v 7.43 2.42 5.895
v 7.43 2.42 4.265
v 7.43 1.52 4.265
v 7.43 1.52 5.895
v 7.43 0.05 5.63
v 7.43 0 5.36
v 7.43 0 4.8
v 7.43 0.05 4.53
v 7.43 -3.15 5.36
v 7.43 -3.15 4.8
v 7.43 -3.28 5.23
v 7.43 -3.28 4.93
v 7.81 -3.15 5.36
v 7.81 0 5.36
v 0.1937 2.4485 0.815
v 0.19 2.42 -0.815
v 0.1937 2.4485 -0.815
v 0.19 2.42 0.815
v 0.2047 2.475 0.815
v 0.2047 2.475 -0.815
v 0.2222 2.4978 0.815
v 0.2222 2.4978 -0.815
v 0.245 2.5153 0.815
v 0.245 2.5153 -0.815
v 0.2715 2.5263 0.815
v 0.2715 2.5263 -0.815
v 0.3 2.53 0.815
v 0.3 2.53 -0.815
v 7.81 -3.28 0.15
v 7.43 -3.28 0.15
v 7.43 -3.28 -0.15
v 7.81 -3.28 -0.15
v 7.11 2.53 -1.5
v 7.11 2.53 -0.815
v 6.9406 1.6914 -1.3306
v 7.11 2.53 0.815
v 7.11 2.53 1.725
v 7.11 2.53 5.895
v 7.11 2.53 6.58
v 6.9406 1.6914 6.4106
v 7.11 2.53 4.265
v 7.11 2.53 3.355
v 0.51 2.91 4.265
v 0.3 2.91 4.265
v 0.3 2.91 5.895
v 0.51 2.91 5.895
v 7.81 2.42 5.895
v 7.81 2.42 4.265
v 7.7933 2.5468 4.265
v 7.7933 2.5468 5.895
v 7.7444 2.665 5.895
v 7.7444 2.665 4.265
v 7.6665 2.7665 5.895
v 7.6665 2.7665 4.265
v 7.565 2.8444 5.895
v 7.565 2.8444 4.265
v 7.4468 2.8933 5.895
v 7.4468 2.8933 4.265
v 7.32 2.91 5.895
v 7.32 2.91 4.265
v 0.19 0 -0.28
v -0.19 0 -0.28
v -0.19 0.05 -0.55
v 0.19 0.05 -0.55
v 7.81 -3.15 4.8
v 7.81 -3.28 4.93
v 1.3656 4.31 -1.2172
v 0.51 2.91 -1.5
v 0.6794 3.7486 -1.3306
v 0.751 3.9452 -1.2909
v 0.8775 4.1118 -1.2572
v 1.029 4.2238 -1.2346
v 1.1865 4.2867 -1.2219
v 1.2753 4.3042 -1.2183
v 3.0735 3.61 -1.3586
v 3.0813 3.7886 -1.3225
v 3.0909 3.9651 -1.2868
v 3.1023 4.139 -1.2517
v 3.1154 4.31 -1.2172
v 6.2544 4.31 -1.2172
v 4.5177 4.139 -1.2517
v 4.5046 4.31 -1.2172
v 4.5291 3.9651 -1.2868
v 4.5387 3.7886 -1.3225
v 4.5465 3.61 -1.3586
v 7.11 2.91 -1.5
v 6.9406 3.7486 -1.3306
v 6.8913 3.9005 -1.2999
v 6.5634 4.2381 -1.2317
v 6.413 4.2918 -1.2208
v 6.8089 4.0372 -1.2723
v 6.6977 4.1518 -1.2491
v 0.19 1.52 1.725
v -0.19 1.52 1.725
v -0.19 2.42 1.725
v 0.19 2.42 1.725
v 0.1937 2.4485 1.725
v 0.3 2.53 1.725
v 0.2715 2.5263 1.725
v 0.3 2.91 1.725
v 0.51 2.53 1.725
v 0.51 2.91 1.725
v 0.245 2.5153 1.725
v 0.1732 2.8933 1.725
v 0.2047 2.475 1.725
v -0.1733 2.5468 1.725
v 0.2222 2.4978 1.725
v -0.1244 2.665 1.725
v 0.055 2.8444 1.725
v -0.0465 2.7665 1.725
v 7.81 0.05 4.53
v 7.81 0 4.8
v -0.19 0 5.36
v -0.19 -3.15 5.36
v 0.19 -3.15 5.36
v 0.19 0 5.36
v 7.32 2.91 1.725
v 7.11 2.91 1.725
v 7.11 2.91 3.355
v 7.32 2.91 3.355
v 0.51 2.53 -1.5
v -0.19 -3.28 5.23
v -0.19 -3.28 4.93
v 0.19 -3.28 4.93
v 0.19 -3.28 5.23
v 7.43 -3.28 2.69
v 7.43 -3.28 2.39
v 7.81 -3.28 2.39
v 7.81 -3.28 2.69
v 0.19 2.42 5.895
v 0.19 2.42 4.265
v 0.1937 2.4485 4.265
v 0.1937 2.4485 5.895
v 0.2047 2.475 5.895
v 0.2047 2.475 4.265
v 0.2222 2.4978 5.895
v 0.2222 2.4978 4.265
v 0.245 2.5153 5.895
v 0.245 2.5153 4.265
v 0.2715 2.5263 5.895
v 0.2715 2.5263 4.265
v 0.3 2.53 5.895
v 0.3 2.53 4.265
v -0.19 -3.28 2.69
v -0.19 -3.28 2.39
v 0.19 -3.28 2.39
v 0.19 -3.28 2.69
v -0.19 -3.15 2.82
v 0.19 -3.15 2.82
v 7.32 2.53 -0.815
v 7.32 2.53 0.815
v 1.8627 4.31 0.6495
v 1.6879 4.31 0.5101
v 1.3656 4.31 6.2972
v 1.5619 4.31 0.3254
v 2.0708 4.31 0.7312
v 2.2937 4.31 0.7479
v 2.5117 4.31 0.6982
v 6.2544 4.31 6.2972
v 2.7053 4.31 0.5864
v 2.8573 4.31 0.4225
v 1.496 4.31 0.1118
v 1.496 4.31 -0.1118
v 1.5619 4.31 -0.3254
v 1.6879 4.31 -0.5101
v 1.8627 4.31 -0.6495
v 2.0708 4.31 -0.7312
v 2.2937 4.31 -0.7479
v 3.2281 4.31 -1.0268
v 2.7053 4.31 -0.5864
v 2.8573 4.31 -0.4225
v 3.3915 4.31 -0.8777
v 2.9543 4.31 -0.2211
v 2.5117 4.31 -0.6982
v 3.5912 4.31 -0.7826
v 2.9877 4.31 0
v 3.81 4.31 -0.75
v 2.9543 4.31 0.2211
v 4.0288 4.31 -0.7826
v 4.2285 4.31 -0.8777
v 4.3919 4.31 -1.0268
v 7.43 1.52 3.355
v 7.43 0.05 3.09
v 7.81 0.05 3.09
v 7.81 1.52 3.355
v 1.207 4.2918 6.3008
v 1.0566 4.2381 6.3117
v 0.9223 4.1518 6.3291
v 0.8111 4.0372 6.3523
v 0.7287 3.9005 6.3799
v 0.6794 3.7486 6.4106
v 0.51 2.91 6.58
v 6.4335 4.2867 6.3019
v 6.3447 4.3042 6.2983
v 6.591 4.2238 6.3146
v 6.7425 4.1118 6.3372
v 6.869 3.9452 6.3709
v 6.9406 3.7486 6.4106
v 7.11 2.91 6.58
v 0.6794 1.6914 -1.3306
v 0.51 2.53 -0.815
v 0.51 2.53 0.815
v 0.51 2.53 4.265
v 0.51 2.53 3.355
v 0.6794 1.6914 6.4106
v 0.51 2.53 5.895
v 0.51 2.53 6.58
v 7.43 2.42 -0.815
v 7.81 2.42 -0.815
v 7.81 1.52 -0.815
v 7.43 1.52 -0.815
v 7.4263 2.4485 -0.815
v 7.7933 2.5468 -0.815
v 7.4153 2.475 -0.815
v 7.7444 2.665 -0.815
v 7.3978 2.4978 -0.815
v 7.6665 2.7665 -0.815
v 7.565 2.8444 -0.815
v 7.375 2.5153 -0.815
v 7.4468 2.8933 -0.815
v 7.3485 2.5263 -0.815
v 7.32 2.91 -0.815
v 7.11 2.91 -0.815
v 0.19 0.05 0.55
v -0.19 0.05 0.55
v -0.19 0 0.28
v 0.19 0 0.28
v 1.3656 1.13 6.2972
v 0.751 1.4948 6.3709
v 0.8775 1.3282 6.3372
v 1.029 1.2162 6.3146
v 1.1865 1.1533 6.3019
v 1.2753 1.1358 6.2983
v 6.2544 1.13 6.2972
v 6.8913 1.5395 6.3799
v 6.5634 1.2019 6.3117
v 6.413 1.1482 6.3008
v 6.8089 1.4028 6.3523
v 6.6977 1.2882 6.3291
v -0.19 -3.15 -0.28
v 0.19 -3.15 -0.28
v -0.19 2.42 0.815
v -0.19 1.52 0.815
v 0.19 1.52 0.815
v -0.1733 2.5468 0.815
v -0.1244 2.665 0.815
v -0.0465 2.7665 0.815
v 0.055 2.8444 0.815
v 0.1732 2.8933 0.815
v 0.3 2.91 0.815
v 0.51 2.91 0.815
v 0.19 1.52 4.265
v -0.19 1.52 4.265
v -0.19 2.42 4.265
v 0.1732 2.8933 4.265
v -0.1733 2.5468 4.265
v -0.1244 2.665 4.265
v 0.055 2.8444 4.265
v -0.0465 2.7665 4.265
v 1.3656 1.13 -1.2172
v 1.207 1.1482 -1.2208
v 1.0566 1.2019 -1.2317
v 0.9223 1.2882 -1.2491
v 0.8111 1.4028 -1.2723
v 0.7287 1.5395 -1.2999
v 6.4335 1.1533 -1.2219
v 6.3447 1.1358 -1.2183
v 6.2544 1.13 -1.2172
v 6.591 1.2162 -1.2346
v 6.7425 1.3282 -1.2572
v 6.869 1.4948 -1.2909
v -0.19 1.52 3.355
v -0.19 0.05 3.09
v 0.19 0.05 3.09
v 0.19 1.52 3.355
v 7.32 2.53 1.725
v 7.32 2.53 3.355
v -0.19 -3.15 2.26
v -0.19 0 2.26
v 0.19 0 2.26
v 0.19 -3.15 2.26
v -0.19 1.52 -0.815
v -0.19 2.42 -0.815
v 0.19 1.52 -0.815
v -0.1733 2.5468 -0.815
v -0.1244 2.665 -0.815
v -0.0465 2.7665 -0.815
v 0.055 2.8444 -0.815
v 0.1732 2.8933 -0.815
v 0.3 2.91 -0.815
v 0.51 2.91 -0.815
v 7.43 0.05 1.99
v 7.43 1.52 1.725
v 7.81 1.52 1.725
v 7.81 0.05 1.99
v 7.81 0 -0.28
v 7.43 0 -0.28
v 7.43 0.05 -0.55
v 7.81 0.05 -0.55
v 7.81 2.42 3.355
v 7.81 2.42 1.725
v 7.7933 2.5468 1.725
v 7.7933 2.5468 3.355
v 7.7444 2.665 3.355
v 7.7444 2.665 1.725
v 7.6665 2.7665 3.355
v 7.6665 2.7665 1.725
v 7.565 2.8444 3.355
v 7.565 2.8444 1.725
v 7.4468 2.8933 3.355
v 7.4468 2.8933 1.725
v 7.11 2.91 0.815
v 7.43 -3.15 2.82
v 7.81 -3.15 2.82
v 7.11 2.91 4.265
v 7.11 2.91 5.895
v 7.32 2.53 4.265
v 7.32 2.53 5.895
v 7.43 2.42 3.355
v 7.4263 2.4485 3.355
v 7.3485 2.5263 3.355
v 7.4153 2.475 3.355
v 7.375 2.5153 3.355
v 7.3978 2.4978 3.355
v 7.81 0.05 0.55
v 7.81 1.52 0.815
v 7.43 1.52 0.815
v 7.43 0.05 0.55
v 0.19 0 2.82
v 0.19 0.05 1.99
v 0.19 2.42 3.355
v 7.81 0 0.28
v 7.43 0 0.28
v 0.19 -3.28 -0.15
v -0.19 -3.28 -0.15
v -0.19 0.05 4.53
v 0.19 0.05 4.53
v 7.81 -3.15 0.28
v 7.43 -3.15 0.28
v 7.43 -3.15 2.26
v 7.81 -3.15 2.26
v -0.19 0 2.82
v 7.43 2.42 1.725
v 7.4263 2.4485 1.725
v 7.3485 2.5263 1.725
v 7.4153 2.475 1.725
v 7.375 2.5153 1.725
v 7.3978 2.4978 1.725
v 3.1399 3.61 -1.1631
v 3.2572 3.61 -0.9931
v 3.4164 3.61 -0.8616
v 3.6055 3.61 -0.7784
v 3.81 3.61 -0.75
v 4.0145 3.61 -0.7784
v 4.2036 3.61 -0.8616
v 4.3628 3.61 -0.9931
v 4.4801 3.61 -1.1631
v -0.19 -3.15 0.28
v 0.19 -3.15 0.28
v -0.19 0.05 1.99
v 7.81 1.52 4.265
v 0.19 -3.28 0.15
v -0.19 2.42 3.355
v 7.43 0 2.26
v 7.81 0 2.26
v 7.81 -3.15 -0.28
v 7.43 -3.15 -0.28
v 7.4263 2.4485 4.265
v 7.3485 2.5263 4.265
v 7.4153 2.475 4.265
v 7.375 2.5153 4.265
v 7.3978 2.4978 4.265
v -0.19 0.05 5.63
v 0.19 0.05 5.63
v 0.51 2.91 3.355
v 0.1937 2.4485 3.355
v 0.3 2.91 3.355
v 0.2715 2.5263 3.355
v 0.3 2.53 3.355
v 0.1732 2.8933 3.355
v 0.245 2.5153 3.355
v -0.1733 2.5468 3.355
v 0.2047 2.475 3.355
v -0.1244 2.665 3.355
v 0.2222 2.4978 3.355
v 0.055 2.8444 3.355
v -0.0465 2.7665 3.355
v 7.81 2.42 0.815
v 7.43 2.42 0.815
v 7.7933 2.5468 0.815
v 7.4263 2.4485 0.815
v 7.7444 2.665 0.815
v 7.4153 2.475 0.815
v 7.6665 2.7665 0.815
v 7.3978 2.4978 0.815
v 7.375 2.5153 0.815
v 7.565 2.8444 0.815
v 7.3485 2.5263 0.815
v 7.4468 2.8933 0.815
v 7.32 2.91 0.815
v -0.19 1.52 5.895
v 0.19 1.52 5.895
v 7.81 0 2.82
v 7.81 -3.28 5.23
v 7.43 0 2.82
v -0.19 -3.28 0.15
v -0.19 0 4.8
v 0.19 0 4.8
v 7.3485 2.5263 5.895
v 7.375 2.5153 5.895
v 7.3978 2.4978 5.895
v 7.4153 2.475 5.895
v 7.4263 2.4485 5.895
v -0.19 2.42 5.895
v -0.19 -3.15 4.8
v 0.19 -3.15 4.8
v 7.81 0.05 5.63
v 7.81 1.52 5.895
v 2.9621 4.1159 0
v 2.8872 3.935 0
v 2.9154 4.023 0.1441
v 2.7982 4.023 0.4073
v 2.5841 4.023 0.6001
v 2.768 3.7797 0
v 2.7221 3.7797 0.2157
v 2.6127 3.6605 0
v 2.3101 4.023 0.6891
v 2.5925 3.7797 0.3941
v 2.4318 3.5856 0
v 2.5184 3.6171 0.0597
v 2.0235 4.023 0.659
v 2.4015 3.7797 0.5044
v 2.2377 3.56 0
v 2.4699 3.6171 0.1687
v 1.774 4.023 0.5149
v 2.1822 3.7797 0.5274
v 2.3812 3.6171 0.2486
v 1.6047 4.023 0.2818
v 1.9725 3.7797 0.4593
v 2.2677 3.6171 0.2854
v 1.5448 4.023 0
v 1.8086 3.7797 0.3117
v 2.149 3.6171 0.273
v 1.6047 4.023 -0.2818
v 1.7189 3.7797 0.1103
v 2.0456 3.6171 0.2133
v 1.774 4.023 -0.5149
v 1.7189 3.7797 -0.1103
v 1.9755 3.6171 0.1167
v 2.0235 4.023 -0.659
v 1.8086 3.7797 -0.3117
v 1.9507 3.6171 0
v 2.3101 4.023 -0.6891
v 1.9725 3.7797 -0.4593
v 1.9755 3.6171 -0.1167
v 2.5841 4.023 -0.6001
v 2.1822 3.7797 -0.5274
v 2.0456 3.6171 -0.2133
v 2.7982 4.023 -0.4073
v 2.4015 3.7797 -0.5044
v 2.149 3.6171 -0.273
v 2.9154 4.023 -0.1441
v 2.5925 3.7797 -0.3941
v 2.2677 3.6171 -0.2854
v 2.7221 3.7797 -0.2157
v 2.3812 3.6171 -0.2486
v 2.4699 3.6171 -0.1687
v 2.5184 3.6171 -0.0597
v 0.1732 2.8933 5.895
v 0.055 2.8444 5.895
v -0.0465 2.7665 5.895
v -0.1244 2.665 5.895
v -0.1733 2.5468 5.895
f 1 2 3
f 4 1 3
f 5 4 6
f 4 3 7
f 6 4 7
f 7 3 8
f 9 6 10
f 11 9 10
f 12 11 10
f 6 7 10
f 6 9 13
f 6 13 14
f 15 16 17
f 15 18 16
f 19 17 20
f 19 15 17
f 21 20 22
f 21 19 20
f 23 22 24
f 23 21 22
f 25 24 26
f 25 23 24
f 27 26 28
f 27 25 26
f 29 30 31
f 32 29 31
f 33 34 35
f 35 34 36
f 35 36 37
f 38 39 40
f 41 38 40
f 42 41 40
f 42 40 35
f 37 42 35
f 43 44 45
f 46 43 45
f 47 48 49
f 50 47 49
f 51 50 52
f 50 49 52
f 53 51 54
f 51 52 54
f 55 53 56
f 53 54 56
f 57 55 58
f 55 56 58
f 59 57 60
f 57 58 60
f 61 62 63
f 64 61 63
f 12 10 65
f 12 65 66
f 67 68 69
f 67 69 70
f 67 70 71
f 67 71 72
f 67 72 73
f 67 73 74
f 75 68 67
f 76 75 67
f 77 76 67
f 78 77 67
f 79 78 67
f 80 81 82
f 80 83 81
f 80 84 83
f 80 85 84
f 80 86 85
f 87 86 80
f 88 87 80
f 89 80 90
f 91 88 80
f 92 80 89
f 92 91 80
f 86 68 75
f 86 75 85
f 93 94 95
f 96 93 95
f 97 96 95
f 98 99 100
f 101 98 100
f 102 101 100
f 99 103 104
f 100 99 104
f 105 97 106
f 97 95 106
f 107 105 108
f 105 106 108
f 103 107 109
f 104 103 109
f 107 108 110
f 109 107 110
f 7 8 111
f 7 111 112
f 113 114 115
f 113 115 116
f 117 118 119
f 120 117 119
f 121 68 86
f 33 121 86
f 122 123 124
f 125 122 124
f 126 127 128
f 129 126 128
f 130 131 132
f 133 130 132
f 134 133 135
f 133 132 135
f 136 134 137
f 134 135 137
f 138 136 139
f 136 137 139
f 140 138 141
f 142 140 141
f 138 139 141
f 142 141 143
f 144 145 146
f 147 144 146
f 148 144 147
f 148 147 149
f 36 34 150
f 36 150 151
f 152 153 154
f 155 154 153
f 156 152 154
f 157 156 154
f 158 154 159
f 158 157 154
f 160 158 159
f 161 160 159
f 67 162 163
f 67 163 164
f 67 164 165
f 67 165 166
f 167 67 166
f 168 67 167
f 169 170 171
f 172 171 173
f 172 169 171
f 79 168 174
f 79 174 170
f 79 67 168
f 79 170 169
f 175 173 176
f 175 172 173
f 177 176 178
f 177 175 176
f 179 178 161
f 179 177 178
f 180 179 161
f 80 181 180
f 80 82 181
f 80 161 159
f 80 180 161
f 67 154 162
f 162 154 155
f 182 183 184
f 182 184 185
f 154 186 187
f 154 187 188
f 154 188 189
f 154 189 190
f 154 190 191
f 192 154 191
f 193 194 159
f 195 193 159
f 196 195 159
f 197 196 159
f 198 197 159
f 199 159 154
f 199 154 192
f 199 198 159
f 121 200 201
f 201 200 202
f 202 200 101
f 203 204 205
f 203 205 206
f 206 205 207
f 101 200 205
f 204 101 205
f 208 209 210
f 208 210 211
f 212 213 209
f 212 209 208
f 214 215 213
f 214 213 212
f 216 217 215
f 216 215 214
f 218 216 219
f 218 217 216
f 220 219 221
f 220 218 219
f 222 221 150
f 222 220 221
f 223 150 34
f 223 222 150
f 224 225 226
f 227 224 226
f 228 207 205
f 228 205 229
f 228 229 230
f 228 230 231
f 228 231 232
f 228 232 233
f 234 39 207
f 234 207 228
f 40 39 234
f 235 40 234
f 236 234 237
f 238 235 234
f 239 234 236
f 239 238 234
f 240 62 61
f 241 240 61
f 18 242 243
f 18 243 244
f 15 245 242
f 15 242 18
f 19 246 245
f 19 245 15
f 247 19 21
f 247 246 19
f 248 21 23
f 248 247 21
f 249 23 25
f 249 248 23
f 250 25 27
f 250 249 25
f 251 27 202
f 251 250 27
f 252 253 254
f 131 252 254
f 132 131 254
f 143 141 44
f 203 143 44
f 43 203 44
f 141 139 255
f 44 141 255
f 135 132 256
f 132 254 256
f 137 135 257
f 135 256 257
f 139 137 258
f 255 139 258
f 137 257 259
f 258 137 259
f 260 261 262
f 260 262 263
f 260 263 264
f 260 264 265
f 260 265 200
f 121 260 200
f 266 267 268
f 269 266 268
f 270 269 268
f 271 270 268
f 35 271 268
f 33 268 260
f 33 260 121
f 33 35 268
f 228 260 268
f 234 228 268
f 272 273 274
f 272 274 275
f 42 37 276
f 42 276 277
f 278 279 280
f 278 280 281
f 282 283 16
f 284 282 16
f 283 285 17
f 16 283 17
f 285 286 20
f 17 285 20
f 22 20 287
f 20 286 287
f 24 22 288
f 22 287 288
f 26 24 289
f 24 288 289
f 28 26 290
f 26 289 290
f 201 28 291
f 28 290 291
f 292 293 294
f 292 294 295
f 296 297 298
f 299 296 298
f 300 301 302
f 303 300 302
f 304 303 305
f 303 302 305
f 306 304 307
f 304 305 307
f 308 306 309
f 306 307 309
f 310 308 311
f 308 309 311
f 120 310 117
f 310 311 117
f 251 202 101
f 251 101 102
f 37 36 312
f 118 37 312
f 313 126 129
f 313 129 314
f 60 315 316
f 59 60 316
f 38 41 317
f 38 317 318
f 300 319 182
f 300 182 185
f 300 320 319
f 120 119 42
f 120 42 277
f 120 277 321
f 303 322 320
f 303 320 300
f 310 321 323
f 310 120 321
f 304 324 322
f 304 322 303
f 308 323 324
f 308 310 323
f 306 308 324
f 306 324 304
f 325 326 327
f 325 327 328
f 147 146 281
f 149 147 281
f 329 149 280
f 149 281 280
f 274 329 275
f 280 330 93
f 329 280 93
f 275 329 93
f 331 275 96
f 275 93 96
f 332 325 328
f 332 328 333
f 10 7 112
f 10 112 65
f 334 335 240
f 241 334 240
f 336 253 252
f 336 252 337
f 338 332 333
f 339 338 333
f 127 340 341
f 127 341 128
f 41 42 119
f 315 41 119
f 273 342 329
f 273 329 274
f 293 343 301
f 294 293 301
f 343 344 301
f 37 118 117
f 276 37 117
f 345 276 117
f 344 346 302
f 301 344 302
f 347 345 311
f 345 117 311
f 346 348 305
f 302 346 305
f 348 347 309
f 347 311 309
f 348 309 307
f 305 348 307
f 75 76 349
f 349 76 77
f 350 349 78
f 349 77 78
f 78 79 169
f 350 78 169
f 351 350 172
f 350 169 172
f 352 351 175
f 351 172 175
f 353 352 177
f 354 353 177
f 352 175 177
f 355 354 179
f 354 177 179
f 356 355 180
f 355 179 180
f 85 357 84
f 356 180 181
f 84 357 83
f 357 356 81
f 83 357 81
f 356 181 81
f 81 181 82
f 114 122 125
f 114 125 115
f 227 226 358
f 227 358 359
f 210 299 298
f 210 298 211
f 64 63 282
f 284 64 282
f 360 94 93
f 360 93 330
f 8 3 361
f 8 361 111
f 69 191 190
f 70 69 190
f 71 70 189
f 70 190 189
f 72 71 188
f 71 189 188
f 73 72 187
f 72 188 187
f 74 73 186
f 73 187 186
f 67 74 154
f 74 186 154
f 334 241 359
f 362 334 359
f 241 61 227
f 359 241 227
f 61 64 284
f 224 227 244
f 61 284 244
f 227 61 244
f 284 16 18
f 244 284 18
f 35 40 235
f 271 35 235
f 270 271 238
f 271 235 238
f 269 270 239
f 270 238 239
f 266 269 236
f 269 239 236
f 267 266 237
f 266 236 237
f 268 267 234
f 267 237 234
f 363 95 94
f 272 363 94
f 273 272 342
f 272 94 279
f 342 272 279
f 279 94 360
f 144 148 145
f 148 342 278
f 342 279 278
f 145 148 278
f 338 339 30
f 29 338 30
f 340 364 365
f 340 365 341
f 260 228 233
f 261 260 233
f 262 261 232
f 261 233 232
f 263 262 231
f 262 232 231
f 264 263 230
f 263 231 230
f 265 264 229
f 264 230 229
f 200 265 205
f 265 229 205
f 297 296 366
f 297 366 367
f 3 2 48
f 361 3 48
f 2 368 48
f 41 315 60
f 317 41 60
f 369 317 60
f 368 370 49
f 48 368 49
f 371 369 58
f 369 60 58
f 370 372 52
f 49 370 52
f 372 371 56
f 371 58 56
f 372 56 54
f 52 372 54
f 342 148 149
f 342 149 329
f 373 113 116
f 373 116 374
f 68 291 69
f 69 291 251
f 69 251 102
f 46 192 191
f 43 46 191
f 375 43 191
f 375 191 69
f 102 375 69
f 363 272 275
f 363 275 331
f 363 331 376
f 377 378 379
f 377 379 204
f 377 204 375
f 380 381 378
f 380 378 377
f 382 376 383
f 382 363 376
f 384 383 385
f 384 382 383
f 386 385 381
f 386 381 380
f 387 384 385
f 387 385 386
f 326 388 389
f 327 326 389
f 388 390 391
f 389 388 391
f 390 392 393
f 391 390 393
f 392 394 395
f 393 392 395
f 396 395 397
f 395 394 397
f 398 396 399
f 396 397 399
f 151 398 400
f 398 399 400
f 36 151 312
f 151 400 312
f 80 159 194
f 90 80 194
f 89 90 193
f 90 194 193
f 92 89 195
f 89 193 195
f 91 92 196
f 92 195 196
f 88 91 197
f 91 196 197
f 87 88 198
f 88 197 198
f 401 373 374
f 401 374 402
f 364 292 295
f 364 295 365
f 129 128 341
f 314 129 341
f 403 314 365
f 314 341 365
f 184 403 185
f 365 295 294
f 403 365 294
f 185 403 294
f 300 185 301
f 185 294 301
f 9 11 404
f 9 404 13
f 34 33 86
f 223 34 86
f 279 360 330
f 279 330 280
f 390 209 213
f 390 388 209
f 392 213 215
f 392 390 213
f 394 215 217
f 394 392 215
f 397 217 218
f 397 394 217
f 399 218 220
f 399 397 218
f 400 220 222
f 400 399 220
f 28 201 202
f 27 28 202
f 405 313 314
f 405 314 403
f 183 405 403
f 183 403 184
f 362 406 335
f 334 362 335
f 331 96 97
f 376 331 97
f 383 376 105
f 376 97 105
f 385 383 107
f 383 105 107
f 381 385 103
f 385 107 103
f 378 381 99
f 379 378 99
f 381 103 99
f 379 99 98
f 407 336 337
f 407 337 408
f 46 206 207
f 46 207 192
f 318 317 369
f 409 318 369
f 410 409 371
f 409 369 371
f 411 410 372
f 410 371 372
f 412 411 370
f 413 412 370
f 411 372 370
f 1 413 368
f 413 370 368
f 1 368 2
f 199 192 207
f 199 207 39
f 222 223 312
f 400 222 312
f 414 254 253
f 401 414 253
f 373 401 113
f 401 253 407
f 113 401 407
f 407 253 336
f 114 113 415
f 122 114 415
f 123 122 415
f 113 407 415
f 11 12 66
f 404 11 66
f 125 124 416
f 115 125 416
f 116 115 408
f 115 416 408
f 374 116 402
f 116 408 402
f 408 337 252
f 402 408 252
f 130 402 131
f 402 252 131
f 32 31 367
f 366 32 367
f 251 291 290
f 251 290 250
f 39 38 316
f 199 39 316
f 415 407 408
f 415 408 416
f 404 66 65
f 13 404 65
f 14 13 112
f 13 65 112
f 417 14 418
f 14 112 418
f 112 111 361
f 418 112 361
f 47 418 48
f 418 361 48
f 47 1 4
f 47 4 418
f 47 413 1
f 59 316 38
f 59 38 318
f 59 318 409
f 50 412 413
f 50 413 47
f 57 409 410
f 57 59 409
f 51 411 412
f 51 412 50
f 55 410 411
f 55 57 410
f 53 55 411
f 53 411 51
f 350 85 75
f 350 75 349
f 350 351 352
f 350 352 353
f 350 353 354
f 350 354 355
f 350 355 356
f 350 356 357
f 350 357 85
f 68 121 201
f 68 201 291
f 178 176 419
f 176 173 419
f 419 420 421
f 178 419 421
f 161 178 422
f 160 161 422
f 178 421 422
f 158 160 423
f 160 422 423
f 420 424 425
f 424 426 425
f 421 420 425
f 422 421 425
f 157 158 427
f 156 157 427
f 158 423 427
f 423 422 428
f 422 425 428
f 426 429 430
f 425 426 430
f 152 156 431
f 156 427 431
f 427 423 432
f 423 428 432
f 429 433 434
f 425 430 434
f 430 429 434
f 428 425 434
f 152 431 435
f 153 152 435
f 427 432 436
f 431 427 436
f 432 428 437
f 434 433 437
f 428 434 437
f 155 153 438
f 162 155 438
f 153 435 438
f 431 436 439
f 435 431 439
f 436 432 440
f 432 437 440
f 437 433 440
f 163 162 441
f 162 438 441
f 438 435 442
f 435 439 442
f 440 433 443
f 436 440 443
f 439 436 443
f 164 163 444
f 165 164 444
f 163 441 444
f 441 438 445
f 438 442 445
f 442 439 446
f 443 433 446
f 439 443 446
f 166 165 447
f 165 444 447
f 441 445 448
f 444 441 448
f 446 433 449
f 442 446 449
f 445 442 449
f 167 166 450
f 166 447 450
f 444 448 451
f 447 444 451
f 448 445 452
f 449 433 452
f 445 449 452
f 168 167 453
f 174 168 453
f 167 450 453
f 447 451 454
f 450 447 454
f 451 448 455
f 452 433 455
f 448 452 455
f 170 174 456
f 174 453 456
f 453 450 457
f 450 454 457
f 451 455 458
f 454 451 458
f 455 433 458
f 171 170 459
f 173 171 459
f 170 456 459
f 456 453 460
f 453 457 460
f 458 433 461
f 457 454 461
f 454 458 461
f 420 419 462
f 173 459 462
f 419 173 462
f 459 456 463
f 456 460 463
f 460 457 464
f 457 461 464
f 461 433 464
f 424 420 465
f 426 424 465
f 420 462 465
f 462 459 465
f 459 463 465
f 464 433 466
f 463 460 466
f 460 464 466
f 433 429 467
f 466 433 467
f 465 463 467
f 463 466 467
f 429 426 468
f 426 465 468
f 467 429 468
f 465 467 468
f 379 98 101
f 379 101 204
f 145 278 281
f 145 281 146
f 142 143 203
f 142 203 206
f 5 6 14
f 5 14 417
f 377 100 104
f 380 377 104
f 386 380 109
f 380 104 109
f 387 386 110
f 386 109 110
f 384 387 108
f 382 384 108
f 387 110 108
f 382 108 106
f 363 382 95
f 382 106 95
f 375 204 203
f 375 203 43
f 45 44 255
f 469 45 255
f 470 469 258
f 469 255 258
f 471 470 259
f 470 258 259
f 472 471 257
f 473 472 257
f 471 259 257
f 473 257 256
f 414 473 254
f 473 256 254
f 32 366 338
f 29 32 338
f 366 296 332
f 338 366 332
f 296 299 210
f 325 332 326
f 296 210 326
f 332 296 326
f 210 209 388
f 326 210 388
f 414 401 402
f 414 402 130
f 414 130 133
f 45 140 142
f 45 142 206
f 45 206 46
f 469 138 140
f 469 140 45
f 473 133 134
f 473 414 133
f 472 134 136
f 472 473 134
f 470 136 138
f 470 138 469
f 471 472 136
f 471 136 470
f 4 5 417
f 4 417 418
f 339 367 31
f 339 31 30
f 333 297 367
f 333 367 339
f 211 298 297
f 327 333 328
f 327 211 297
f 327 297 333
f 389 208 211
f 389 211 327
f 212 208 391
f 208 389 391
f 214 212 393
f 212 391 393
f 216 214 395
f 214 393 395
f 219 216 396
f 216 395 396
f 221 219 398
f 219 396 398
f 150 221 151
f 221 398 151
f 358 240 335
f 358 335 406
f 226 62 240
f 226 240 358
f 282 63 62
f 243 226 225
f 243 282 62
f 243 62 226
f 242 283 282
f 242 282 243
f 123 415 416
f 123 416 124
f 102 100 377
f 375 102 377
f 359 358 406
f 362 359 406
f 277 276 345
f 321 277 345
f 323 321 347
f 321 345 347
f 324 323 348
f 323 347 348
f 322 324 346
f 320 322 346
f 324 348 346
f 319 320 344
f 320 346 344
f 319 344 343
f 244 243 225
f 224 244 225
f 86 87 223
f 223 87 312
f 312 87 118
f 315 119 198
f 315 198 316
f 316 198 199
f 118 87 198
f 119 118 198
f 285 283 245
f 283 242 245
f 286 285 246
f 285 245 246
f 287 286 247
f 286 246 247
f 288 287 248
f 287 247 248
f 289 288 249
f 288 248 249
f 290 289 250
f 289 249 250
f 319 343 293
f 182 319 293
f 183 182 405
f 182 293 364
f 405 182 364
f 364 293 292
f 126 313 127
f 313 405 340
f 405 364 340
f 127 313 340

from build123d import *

# Parameters (mm, degrees)
BASE_EXTRUDE_DEPTH      = 6.58
BASE_EXTRUDE_DEPTH_BACK = 1.5
SKETCH1_W               = 6.6
SKETCH1_H               = 3.18
SKETCH2_OUTSIDE_W       = 10.782
SKETCH2_OUTSIDE_H       = 7.362
CUT_EXTRUDE1_DEPTH      = 12.593731065
SKETCH3_OUTSIDE_W       = 12.262
SKETCH3_OUTSIDE_H       = 7.362
CUT_EXTRUDE2_DEPTH      = 11.268032918
SKETCH5_W               = 1.63
SKETCH5_H               = 0.38
BOSS_EXTRUDE3_DEPTH     = 0.7
SKETCH6_W               = 0.38
SKETCH6_H               = 1.63
BOSS_EXTRUDE4_DEPTH     = 2.53
SKETCH4_W               = 0.38
SKETCH4_H               = 0.56
BOSS_EXTRUDE5_DEPTH     = 3.28
CUT_EXTRUDE5_DEPTH      = 0.38
FILLET1_R               = 0.49
FILLET2_R               = 0.11
FILLET1_OF_MIRROR1_R    = 0.49
FILLET2_OF_MIRROR1_R    = 0.11
LPATTERN1_START         = 0.3
LPATTERN1_OUTLINE_W     = 0.38
LPATTERN1_OUTLINE_H     = 1.63
LPATTERN1_DEPTH         = 7.02
LPATTERN1_START_2       = 1.725
LPATTERN1_2_DEPTH       = 1.63
LPATTERN1_START_3       = 4.265
LPATTERN1_3_DEPTH       = 1.63
LPATTERN1_START_4       = -0.19
LPATTERN1_4_DEPTH       = 0.38
LPATTERN1_START_5       = 7.43
LPATTERN1_5_DEPTH       = 0.38
SKETCH9_R               = 0.75
CUT_EXTRUDE6_DEPTH      = 0.7


with BuildPart() as part:
    # Sketch1 → Base-Extrude (new, two sides: drawn at the far end of the back side and taken through both)
    with BuildSketch(Plane.XY.offset(-BASE_EXTRUDE_DEPTH_BACK)):
        with Locations((3.81, 2.72)):
            Rectangle(SKETCH1_W, SKETCH1_H)
    extrude(amount=BASE_EXTRUDE_DEPTH + BASE_EXTRUDE_DEPTH_BACK)

    # Sketch2 outside → Cut-Extrude1 (cut, through all)
    with BuildSketch(Plane.XY.offset(6.58)):
        with Locations((3.81, 2.72)):
            Rectangle(SKETCH2_OUTSIDE_W, SKETCH2_OUTSIDE_H)
        with BuildLine():
            Line((0.51, 2.91), (0.679431307, 3.748623606))
            ThreePointArc((0.679431307, 3.748623606), (0.922305346, 4.151773257), (1.365567952, 4.31))
            Line((1.365567952, 4.31), (6.254432048, 4.31))
            ThreePointArc((6.254432048, 4.31), (6.697694654, 4.151773257), (6.940568693, 3.748623606))
            Line((6.940568693, 3.748623606), (7.11, 2.91))
            Line((7.11, 2.91), (7.11, 2.53))
            Line((7.11, 2.53), (6.940568693, 1.691376394))
            ThreePointArc((6.940568693, 1.691376394), (6.697694654, 1.288226743), (6.254432048, 1.13))
            Line((6.254432048, 1.13), (1.365567952, 1.13))
            ThreePointArc((1.365567952, 1.13), (0.922305346, 1.288226743), (0.679431307, 1.691376394))
            Line((0.679431307, 1.691376394), (0.51, 2.53))
            Line((0.51, 2.53), (0.51, 2.91))
        make_face(mode=Mode.SUBTRACT)
    extrude(amount=-CUT_EXTRUDE1_DEPTH, mode=Mode.SUBTRACT)

    # Sketch3 outside → Cut-Extrude2 (cut, through all)
    with BuildSketch(Plane(origin=(7.11, 0, 0), x_dir=(0, 0, -1), z_dir=(1, 0, 0))):
        with Locations((-2.54, 2.72)):
            Rectangle(SKETCH3_OUTSIDE_W, SKETCH3_OUTSIDE_H)
        Polygon((1.5, 2.91), (1.134316679, 4.72), (-6.214316679, 4.72), (-6.58, 2.91), (-6.58, 2.53), (-6.214316679, 0.72), (1.134316679, 0.72), (1.5, 2.53), align=None, mode=Mode.SUBTRACT)
    extrude(amount=-CUT_EXTRUDE2_DEPTH, mode=Mode.SUBTRACT)

    # Sketch5 → Boss-Extrude3 (add)
    with BuildSketch(Plane.ZY.offset(-0.51)):
        with Locations((0, 2.72)):
            Rectangle(SKETCH5_W, SKETCH5_H)
    boss_extrude3 = extrude(amount=BOSS_EXTRUDE3_DEPTH)

    # Sketch8 → Cut-Revolve1 (revolve, cut)
    with BuildSketch(Plane.XY):
        with BuildLine():
            Line((2.237663013, 3.56), (2.237663013, 4.31))
            Line((2.237663013, 4.31), (2.987663013, 4.31))
            ThreePointArc((2.987663013, 4.31), (2.767993099, 3.779669914), (2.237663013, 3.56))
        make_face()
    revolve(axis=Axis((2.237663013, 4.928970116, 0), (0, -1, 0)), mode=Mode.SUBTRACT)

    # Sketch6 → Boss-Extrude4 (add)
    with BuildSketch(Plane.XZ.offset(-2.53)):
        Rectangle(SKETCH6_W, SKETCH6_H)
    boss_extrude4 = extrude(amount=BOSS_EXTRUDE4_DEPTH)

    # Sketch4 → Boss-Extrude5 (add)
    with BuildSketch(Plane(origin=(0, 0, 0), x_dir=(1, 0, 0), z_dir=(0, 1, 0))):
        Rectangle(SKETCH4_W, SKETCH4_H)
    boss_extrude5 = extrude(amount=-BOSS_EXTRUDE5_DEPTH)

    # Sketch7 → Cut-Extrude5 (cut)
    with BuildSketch(Plane.ZY.offset(0.19)):
        Polygon((0.815, 1.52), (0.55, 0.05), (0.28, 0), (0.28, -3.15), (0.15, -3.28), (-0.15, -3.28), (-0.28, -3.15), (-0.28, 0), (-0.55, 0.05), (-0.815, 1.52), (-0.815, -3.78), (0.815, -3.78), align=None)
    cut_extrude5 = extrude(amount=-CUT_EXTRUDE5_DEPTH, mode=Mode.SUBTRACT)

    # Fillet1
    fillet1_edges = [part.edges().sort_by_distance(p)[0] for p in [
        (-0.19, 2.91, 0),
    ]]
    fillet(fillet1_edges, radius=FILLET1_R)

    # Fillet2
    fillet2_edges = [part.edges().sort_by_distance(p)[0] for p in [
        (0.19, 2.53, 0),
    ]]
    fillet(fillet2_edges, radius=FILLET2_R)

    # Mirror1: Boss-Extrude3, Boss-Extrude4, Boss-Extrude5, Cut-Extrude5 across plane
    add(boss_extrude3.mirror(Plane.ZY.offset(-3.81)))
    add(boss_extrude4.mirror(Plane.ZY.offset(-3.81)))
    add(boss_extrude5.mirror(Plane.ZY.offset(-3.81)))
    add(cut_extrude5.mirror(Plane.ZY.offset(-3.81)), mode=Mode.SUBTRACT)

    # Fillet1 of Mirror1
    fillet1_of_mirror1_edges = [part.edges().sort_by_distance(p)[0] for p in [
        (7.81, 2.91, 0),
    ]]
    fillet(fillet1_of_mirror1_edges, radius=FILLET1_OF_MIRROR1_R)

    # Fillet2 of Mirror1
    fillet2_of_mirror1_edges = [part.edges().sort_by_distance(p)[0] for p in [
        (7.43, 2.53, 0),
    ]]
    fillet(fillet2_of_mirror1_edges, radius=FILLET2_OF_MIRROR1_R)

    # LPattern1: read off the stored shape, not the designer's step
    # LPattern1 outline → LPattern1 (add)
    with BuildSketch(Plane.YZ.offset(LPATTERN1_START)):
        with Locations((2.72, 5.08)):
            Rectangle(LPATTERN1_OUTLINE_W, LPATTERN1_OUTLINE_H)
        with Locations((2.72, 2.54)):
            Rectangle(LPATTERN1_OUTLINE_W, LPATTERN1_OUTLINE_H)
    extrude(amount=LPATTERN1_DEPTH)

    # LPattern1 2 outline → LPattern1 2 (add)
    with BuildSketch(Plane.XY.offset(LPATTERN1_START_2)):
        with BuildLine():
            Line((7.43, -3.28), (7.81, -3.28))
            Line((7.81, -3.28), (7.81, 2.42))
            ThreePointArc((7.81, 2.42), (7.666482323, 2.766482323), (7.32, 2.91))
            Line((7.32, 2.91), (7.32, 2.53))
            ThreePointArc((7.32, 2.53), (7.397781746, 2.497781746), (7.43, 2.42))
            Line((7.43, 2.42), (7.43, -3.28))
        make_face()
        with BuildLine():
            Line((-0.19, 2.42), (-0.19, -3.28))
            Line((-0.19, -3.28), (0.19, -3.28))
            Line((0.19, -3.28), (0.19, 2.42))
            ThreePointArc((0.19, 2.42), (0.222218254, 2.497781746), (0.3, 2.53))
            Line((0.3, 2.53), (0.3, 2.91))
            ThreePointArc((0.3, 2.91), (-0.046482323, 2.766482323), (-0.19, 2.42))
        make_face()
    extrude(amount=LPATTERN1_2_DEPTH)

    # LPattern1 3 outline → LPattern1 3 (add)
    with BuildSketch(Plane.XY.offset(LPATTERN1_START_3)):
        with BuildLine():
            Line((7.43, -3.28), (7.81, -3.28))
            Line((7.81, -3.28), (7.81, 2.42))
            ThreePointArc((7.81, 2.42), (7.666482323, 2.766482323), (7.32, 2.91))
            Line((7.32, 2.91), (7.32, 2.53))
            ThreePointArc((7.32, 2.53), (7.397781746, 2.497781746), (7.43, 2.42))
            Line((7.43, 2.42), (7.43, -3.28))
        make_face()
        with BuildLine():
            Line((-0.19, 2.42), (-0.19, -3.28))
            Line((-0.19, -3.28), (0.19, -3.28))
            Line((0.19, -3.28), (0.19, 2.42))
            ThreePointArc((0.19, 2.42), (0.222218254, 2.497781746), (0.3, 2.53))
            Line((0.3, 2.53), (0.3, 2.91))
            ThreePointArc((0.3, 2.91), (-0.046482323, 2.766482323), (-0.19, 2.42))
        make_face()
    extrude(amount=LPATTERN1_3_DEPTH)

    # LPattern1 4 outline → LPattern1 4 (cut)
    with BuildSketch(Plane.YZ.offset(LPATTERN1_START_4)):
        Polygon((-3.28, 5.23), (-3.15, 5.36), (0, 5.36), (0.05, 5.63), (1.52, 5.895), (-3.28, 5.895), align=None)
        Polygon((-3.15, 4.8), (-3.28, 4.93), (-3.28, 4.265), (1.52, 4.265), (0.05, 4.53), (0, 4.8), align=None)
        Polygon((-3.28, 2.69), (-3.15, 2.82), (0, 2.82), (0.05, 3.09), (1.52, 3.355), (-3.28, 3.355), align=None)
        Polygon((-3.15, 2.26), (-3.28, 2.39), (-3.28, 1.725), (1.52, 1.725), (0.05, 1.99), (0, 2.26), align=None)
    extrude(amount=LPATTERN1_4_DEPTH, mode=Mode.SUBTRACT)

    # LPattern1 5 outline → LPattern1 5 (cut)
    with BuildSketch(Plane.YZ.offset(LPATTERN1_START_5)):
        Polygon((-3.28, 5.23), (-3.15, 5.36), (0, 5.36), (0.05, 5.63), (1.52, 5.895), (-3.28, 5.895), align=None)
        Polygon((-3.15, 4.8), (-3.28, 4.93), (-3.28, 4.265), (1.52, 4.265), (0.05, 4.53), (0, 4.8), align=None)
        Polygon((-3.28, 2.69), (-3.15, 2.82), (0, 2.82), (0.05, 3.09), (1.52, 3.355), (-3.28, 3.355), align=None)
        Polygon((-3.15, 2.26), (-3.28, 2.39), (-3.28, 1.725), (1.52, 1.725), (0.05, 1.99), (0, 2.26), align=None)
    extrude(amount=LPATTERN1_5_DEPTH, mode=Mode.SUBTRACT)

    # Sketch9 → Cut-Extrude6 (cut)
    with BuildSketch(Plane(origin=(0, 4.31, 0), x_dir=(-1, 0, 0), z_dir=(0, 1, 0))):
        with Locations((-3.81, -1.5)):
            Circle(SKETCH9_R)
    extrude(amount=-CUT_EXTRUDE6_DEPTH, mode=Mode.SUBTRACT)


solid = part.part
